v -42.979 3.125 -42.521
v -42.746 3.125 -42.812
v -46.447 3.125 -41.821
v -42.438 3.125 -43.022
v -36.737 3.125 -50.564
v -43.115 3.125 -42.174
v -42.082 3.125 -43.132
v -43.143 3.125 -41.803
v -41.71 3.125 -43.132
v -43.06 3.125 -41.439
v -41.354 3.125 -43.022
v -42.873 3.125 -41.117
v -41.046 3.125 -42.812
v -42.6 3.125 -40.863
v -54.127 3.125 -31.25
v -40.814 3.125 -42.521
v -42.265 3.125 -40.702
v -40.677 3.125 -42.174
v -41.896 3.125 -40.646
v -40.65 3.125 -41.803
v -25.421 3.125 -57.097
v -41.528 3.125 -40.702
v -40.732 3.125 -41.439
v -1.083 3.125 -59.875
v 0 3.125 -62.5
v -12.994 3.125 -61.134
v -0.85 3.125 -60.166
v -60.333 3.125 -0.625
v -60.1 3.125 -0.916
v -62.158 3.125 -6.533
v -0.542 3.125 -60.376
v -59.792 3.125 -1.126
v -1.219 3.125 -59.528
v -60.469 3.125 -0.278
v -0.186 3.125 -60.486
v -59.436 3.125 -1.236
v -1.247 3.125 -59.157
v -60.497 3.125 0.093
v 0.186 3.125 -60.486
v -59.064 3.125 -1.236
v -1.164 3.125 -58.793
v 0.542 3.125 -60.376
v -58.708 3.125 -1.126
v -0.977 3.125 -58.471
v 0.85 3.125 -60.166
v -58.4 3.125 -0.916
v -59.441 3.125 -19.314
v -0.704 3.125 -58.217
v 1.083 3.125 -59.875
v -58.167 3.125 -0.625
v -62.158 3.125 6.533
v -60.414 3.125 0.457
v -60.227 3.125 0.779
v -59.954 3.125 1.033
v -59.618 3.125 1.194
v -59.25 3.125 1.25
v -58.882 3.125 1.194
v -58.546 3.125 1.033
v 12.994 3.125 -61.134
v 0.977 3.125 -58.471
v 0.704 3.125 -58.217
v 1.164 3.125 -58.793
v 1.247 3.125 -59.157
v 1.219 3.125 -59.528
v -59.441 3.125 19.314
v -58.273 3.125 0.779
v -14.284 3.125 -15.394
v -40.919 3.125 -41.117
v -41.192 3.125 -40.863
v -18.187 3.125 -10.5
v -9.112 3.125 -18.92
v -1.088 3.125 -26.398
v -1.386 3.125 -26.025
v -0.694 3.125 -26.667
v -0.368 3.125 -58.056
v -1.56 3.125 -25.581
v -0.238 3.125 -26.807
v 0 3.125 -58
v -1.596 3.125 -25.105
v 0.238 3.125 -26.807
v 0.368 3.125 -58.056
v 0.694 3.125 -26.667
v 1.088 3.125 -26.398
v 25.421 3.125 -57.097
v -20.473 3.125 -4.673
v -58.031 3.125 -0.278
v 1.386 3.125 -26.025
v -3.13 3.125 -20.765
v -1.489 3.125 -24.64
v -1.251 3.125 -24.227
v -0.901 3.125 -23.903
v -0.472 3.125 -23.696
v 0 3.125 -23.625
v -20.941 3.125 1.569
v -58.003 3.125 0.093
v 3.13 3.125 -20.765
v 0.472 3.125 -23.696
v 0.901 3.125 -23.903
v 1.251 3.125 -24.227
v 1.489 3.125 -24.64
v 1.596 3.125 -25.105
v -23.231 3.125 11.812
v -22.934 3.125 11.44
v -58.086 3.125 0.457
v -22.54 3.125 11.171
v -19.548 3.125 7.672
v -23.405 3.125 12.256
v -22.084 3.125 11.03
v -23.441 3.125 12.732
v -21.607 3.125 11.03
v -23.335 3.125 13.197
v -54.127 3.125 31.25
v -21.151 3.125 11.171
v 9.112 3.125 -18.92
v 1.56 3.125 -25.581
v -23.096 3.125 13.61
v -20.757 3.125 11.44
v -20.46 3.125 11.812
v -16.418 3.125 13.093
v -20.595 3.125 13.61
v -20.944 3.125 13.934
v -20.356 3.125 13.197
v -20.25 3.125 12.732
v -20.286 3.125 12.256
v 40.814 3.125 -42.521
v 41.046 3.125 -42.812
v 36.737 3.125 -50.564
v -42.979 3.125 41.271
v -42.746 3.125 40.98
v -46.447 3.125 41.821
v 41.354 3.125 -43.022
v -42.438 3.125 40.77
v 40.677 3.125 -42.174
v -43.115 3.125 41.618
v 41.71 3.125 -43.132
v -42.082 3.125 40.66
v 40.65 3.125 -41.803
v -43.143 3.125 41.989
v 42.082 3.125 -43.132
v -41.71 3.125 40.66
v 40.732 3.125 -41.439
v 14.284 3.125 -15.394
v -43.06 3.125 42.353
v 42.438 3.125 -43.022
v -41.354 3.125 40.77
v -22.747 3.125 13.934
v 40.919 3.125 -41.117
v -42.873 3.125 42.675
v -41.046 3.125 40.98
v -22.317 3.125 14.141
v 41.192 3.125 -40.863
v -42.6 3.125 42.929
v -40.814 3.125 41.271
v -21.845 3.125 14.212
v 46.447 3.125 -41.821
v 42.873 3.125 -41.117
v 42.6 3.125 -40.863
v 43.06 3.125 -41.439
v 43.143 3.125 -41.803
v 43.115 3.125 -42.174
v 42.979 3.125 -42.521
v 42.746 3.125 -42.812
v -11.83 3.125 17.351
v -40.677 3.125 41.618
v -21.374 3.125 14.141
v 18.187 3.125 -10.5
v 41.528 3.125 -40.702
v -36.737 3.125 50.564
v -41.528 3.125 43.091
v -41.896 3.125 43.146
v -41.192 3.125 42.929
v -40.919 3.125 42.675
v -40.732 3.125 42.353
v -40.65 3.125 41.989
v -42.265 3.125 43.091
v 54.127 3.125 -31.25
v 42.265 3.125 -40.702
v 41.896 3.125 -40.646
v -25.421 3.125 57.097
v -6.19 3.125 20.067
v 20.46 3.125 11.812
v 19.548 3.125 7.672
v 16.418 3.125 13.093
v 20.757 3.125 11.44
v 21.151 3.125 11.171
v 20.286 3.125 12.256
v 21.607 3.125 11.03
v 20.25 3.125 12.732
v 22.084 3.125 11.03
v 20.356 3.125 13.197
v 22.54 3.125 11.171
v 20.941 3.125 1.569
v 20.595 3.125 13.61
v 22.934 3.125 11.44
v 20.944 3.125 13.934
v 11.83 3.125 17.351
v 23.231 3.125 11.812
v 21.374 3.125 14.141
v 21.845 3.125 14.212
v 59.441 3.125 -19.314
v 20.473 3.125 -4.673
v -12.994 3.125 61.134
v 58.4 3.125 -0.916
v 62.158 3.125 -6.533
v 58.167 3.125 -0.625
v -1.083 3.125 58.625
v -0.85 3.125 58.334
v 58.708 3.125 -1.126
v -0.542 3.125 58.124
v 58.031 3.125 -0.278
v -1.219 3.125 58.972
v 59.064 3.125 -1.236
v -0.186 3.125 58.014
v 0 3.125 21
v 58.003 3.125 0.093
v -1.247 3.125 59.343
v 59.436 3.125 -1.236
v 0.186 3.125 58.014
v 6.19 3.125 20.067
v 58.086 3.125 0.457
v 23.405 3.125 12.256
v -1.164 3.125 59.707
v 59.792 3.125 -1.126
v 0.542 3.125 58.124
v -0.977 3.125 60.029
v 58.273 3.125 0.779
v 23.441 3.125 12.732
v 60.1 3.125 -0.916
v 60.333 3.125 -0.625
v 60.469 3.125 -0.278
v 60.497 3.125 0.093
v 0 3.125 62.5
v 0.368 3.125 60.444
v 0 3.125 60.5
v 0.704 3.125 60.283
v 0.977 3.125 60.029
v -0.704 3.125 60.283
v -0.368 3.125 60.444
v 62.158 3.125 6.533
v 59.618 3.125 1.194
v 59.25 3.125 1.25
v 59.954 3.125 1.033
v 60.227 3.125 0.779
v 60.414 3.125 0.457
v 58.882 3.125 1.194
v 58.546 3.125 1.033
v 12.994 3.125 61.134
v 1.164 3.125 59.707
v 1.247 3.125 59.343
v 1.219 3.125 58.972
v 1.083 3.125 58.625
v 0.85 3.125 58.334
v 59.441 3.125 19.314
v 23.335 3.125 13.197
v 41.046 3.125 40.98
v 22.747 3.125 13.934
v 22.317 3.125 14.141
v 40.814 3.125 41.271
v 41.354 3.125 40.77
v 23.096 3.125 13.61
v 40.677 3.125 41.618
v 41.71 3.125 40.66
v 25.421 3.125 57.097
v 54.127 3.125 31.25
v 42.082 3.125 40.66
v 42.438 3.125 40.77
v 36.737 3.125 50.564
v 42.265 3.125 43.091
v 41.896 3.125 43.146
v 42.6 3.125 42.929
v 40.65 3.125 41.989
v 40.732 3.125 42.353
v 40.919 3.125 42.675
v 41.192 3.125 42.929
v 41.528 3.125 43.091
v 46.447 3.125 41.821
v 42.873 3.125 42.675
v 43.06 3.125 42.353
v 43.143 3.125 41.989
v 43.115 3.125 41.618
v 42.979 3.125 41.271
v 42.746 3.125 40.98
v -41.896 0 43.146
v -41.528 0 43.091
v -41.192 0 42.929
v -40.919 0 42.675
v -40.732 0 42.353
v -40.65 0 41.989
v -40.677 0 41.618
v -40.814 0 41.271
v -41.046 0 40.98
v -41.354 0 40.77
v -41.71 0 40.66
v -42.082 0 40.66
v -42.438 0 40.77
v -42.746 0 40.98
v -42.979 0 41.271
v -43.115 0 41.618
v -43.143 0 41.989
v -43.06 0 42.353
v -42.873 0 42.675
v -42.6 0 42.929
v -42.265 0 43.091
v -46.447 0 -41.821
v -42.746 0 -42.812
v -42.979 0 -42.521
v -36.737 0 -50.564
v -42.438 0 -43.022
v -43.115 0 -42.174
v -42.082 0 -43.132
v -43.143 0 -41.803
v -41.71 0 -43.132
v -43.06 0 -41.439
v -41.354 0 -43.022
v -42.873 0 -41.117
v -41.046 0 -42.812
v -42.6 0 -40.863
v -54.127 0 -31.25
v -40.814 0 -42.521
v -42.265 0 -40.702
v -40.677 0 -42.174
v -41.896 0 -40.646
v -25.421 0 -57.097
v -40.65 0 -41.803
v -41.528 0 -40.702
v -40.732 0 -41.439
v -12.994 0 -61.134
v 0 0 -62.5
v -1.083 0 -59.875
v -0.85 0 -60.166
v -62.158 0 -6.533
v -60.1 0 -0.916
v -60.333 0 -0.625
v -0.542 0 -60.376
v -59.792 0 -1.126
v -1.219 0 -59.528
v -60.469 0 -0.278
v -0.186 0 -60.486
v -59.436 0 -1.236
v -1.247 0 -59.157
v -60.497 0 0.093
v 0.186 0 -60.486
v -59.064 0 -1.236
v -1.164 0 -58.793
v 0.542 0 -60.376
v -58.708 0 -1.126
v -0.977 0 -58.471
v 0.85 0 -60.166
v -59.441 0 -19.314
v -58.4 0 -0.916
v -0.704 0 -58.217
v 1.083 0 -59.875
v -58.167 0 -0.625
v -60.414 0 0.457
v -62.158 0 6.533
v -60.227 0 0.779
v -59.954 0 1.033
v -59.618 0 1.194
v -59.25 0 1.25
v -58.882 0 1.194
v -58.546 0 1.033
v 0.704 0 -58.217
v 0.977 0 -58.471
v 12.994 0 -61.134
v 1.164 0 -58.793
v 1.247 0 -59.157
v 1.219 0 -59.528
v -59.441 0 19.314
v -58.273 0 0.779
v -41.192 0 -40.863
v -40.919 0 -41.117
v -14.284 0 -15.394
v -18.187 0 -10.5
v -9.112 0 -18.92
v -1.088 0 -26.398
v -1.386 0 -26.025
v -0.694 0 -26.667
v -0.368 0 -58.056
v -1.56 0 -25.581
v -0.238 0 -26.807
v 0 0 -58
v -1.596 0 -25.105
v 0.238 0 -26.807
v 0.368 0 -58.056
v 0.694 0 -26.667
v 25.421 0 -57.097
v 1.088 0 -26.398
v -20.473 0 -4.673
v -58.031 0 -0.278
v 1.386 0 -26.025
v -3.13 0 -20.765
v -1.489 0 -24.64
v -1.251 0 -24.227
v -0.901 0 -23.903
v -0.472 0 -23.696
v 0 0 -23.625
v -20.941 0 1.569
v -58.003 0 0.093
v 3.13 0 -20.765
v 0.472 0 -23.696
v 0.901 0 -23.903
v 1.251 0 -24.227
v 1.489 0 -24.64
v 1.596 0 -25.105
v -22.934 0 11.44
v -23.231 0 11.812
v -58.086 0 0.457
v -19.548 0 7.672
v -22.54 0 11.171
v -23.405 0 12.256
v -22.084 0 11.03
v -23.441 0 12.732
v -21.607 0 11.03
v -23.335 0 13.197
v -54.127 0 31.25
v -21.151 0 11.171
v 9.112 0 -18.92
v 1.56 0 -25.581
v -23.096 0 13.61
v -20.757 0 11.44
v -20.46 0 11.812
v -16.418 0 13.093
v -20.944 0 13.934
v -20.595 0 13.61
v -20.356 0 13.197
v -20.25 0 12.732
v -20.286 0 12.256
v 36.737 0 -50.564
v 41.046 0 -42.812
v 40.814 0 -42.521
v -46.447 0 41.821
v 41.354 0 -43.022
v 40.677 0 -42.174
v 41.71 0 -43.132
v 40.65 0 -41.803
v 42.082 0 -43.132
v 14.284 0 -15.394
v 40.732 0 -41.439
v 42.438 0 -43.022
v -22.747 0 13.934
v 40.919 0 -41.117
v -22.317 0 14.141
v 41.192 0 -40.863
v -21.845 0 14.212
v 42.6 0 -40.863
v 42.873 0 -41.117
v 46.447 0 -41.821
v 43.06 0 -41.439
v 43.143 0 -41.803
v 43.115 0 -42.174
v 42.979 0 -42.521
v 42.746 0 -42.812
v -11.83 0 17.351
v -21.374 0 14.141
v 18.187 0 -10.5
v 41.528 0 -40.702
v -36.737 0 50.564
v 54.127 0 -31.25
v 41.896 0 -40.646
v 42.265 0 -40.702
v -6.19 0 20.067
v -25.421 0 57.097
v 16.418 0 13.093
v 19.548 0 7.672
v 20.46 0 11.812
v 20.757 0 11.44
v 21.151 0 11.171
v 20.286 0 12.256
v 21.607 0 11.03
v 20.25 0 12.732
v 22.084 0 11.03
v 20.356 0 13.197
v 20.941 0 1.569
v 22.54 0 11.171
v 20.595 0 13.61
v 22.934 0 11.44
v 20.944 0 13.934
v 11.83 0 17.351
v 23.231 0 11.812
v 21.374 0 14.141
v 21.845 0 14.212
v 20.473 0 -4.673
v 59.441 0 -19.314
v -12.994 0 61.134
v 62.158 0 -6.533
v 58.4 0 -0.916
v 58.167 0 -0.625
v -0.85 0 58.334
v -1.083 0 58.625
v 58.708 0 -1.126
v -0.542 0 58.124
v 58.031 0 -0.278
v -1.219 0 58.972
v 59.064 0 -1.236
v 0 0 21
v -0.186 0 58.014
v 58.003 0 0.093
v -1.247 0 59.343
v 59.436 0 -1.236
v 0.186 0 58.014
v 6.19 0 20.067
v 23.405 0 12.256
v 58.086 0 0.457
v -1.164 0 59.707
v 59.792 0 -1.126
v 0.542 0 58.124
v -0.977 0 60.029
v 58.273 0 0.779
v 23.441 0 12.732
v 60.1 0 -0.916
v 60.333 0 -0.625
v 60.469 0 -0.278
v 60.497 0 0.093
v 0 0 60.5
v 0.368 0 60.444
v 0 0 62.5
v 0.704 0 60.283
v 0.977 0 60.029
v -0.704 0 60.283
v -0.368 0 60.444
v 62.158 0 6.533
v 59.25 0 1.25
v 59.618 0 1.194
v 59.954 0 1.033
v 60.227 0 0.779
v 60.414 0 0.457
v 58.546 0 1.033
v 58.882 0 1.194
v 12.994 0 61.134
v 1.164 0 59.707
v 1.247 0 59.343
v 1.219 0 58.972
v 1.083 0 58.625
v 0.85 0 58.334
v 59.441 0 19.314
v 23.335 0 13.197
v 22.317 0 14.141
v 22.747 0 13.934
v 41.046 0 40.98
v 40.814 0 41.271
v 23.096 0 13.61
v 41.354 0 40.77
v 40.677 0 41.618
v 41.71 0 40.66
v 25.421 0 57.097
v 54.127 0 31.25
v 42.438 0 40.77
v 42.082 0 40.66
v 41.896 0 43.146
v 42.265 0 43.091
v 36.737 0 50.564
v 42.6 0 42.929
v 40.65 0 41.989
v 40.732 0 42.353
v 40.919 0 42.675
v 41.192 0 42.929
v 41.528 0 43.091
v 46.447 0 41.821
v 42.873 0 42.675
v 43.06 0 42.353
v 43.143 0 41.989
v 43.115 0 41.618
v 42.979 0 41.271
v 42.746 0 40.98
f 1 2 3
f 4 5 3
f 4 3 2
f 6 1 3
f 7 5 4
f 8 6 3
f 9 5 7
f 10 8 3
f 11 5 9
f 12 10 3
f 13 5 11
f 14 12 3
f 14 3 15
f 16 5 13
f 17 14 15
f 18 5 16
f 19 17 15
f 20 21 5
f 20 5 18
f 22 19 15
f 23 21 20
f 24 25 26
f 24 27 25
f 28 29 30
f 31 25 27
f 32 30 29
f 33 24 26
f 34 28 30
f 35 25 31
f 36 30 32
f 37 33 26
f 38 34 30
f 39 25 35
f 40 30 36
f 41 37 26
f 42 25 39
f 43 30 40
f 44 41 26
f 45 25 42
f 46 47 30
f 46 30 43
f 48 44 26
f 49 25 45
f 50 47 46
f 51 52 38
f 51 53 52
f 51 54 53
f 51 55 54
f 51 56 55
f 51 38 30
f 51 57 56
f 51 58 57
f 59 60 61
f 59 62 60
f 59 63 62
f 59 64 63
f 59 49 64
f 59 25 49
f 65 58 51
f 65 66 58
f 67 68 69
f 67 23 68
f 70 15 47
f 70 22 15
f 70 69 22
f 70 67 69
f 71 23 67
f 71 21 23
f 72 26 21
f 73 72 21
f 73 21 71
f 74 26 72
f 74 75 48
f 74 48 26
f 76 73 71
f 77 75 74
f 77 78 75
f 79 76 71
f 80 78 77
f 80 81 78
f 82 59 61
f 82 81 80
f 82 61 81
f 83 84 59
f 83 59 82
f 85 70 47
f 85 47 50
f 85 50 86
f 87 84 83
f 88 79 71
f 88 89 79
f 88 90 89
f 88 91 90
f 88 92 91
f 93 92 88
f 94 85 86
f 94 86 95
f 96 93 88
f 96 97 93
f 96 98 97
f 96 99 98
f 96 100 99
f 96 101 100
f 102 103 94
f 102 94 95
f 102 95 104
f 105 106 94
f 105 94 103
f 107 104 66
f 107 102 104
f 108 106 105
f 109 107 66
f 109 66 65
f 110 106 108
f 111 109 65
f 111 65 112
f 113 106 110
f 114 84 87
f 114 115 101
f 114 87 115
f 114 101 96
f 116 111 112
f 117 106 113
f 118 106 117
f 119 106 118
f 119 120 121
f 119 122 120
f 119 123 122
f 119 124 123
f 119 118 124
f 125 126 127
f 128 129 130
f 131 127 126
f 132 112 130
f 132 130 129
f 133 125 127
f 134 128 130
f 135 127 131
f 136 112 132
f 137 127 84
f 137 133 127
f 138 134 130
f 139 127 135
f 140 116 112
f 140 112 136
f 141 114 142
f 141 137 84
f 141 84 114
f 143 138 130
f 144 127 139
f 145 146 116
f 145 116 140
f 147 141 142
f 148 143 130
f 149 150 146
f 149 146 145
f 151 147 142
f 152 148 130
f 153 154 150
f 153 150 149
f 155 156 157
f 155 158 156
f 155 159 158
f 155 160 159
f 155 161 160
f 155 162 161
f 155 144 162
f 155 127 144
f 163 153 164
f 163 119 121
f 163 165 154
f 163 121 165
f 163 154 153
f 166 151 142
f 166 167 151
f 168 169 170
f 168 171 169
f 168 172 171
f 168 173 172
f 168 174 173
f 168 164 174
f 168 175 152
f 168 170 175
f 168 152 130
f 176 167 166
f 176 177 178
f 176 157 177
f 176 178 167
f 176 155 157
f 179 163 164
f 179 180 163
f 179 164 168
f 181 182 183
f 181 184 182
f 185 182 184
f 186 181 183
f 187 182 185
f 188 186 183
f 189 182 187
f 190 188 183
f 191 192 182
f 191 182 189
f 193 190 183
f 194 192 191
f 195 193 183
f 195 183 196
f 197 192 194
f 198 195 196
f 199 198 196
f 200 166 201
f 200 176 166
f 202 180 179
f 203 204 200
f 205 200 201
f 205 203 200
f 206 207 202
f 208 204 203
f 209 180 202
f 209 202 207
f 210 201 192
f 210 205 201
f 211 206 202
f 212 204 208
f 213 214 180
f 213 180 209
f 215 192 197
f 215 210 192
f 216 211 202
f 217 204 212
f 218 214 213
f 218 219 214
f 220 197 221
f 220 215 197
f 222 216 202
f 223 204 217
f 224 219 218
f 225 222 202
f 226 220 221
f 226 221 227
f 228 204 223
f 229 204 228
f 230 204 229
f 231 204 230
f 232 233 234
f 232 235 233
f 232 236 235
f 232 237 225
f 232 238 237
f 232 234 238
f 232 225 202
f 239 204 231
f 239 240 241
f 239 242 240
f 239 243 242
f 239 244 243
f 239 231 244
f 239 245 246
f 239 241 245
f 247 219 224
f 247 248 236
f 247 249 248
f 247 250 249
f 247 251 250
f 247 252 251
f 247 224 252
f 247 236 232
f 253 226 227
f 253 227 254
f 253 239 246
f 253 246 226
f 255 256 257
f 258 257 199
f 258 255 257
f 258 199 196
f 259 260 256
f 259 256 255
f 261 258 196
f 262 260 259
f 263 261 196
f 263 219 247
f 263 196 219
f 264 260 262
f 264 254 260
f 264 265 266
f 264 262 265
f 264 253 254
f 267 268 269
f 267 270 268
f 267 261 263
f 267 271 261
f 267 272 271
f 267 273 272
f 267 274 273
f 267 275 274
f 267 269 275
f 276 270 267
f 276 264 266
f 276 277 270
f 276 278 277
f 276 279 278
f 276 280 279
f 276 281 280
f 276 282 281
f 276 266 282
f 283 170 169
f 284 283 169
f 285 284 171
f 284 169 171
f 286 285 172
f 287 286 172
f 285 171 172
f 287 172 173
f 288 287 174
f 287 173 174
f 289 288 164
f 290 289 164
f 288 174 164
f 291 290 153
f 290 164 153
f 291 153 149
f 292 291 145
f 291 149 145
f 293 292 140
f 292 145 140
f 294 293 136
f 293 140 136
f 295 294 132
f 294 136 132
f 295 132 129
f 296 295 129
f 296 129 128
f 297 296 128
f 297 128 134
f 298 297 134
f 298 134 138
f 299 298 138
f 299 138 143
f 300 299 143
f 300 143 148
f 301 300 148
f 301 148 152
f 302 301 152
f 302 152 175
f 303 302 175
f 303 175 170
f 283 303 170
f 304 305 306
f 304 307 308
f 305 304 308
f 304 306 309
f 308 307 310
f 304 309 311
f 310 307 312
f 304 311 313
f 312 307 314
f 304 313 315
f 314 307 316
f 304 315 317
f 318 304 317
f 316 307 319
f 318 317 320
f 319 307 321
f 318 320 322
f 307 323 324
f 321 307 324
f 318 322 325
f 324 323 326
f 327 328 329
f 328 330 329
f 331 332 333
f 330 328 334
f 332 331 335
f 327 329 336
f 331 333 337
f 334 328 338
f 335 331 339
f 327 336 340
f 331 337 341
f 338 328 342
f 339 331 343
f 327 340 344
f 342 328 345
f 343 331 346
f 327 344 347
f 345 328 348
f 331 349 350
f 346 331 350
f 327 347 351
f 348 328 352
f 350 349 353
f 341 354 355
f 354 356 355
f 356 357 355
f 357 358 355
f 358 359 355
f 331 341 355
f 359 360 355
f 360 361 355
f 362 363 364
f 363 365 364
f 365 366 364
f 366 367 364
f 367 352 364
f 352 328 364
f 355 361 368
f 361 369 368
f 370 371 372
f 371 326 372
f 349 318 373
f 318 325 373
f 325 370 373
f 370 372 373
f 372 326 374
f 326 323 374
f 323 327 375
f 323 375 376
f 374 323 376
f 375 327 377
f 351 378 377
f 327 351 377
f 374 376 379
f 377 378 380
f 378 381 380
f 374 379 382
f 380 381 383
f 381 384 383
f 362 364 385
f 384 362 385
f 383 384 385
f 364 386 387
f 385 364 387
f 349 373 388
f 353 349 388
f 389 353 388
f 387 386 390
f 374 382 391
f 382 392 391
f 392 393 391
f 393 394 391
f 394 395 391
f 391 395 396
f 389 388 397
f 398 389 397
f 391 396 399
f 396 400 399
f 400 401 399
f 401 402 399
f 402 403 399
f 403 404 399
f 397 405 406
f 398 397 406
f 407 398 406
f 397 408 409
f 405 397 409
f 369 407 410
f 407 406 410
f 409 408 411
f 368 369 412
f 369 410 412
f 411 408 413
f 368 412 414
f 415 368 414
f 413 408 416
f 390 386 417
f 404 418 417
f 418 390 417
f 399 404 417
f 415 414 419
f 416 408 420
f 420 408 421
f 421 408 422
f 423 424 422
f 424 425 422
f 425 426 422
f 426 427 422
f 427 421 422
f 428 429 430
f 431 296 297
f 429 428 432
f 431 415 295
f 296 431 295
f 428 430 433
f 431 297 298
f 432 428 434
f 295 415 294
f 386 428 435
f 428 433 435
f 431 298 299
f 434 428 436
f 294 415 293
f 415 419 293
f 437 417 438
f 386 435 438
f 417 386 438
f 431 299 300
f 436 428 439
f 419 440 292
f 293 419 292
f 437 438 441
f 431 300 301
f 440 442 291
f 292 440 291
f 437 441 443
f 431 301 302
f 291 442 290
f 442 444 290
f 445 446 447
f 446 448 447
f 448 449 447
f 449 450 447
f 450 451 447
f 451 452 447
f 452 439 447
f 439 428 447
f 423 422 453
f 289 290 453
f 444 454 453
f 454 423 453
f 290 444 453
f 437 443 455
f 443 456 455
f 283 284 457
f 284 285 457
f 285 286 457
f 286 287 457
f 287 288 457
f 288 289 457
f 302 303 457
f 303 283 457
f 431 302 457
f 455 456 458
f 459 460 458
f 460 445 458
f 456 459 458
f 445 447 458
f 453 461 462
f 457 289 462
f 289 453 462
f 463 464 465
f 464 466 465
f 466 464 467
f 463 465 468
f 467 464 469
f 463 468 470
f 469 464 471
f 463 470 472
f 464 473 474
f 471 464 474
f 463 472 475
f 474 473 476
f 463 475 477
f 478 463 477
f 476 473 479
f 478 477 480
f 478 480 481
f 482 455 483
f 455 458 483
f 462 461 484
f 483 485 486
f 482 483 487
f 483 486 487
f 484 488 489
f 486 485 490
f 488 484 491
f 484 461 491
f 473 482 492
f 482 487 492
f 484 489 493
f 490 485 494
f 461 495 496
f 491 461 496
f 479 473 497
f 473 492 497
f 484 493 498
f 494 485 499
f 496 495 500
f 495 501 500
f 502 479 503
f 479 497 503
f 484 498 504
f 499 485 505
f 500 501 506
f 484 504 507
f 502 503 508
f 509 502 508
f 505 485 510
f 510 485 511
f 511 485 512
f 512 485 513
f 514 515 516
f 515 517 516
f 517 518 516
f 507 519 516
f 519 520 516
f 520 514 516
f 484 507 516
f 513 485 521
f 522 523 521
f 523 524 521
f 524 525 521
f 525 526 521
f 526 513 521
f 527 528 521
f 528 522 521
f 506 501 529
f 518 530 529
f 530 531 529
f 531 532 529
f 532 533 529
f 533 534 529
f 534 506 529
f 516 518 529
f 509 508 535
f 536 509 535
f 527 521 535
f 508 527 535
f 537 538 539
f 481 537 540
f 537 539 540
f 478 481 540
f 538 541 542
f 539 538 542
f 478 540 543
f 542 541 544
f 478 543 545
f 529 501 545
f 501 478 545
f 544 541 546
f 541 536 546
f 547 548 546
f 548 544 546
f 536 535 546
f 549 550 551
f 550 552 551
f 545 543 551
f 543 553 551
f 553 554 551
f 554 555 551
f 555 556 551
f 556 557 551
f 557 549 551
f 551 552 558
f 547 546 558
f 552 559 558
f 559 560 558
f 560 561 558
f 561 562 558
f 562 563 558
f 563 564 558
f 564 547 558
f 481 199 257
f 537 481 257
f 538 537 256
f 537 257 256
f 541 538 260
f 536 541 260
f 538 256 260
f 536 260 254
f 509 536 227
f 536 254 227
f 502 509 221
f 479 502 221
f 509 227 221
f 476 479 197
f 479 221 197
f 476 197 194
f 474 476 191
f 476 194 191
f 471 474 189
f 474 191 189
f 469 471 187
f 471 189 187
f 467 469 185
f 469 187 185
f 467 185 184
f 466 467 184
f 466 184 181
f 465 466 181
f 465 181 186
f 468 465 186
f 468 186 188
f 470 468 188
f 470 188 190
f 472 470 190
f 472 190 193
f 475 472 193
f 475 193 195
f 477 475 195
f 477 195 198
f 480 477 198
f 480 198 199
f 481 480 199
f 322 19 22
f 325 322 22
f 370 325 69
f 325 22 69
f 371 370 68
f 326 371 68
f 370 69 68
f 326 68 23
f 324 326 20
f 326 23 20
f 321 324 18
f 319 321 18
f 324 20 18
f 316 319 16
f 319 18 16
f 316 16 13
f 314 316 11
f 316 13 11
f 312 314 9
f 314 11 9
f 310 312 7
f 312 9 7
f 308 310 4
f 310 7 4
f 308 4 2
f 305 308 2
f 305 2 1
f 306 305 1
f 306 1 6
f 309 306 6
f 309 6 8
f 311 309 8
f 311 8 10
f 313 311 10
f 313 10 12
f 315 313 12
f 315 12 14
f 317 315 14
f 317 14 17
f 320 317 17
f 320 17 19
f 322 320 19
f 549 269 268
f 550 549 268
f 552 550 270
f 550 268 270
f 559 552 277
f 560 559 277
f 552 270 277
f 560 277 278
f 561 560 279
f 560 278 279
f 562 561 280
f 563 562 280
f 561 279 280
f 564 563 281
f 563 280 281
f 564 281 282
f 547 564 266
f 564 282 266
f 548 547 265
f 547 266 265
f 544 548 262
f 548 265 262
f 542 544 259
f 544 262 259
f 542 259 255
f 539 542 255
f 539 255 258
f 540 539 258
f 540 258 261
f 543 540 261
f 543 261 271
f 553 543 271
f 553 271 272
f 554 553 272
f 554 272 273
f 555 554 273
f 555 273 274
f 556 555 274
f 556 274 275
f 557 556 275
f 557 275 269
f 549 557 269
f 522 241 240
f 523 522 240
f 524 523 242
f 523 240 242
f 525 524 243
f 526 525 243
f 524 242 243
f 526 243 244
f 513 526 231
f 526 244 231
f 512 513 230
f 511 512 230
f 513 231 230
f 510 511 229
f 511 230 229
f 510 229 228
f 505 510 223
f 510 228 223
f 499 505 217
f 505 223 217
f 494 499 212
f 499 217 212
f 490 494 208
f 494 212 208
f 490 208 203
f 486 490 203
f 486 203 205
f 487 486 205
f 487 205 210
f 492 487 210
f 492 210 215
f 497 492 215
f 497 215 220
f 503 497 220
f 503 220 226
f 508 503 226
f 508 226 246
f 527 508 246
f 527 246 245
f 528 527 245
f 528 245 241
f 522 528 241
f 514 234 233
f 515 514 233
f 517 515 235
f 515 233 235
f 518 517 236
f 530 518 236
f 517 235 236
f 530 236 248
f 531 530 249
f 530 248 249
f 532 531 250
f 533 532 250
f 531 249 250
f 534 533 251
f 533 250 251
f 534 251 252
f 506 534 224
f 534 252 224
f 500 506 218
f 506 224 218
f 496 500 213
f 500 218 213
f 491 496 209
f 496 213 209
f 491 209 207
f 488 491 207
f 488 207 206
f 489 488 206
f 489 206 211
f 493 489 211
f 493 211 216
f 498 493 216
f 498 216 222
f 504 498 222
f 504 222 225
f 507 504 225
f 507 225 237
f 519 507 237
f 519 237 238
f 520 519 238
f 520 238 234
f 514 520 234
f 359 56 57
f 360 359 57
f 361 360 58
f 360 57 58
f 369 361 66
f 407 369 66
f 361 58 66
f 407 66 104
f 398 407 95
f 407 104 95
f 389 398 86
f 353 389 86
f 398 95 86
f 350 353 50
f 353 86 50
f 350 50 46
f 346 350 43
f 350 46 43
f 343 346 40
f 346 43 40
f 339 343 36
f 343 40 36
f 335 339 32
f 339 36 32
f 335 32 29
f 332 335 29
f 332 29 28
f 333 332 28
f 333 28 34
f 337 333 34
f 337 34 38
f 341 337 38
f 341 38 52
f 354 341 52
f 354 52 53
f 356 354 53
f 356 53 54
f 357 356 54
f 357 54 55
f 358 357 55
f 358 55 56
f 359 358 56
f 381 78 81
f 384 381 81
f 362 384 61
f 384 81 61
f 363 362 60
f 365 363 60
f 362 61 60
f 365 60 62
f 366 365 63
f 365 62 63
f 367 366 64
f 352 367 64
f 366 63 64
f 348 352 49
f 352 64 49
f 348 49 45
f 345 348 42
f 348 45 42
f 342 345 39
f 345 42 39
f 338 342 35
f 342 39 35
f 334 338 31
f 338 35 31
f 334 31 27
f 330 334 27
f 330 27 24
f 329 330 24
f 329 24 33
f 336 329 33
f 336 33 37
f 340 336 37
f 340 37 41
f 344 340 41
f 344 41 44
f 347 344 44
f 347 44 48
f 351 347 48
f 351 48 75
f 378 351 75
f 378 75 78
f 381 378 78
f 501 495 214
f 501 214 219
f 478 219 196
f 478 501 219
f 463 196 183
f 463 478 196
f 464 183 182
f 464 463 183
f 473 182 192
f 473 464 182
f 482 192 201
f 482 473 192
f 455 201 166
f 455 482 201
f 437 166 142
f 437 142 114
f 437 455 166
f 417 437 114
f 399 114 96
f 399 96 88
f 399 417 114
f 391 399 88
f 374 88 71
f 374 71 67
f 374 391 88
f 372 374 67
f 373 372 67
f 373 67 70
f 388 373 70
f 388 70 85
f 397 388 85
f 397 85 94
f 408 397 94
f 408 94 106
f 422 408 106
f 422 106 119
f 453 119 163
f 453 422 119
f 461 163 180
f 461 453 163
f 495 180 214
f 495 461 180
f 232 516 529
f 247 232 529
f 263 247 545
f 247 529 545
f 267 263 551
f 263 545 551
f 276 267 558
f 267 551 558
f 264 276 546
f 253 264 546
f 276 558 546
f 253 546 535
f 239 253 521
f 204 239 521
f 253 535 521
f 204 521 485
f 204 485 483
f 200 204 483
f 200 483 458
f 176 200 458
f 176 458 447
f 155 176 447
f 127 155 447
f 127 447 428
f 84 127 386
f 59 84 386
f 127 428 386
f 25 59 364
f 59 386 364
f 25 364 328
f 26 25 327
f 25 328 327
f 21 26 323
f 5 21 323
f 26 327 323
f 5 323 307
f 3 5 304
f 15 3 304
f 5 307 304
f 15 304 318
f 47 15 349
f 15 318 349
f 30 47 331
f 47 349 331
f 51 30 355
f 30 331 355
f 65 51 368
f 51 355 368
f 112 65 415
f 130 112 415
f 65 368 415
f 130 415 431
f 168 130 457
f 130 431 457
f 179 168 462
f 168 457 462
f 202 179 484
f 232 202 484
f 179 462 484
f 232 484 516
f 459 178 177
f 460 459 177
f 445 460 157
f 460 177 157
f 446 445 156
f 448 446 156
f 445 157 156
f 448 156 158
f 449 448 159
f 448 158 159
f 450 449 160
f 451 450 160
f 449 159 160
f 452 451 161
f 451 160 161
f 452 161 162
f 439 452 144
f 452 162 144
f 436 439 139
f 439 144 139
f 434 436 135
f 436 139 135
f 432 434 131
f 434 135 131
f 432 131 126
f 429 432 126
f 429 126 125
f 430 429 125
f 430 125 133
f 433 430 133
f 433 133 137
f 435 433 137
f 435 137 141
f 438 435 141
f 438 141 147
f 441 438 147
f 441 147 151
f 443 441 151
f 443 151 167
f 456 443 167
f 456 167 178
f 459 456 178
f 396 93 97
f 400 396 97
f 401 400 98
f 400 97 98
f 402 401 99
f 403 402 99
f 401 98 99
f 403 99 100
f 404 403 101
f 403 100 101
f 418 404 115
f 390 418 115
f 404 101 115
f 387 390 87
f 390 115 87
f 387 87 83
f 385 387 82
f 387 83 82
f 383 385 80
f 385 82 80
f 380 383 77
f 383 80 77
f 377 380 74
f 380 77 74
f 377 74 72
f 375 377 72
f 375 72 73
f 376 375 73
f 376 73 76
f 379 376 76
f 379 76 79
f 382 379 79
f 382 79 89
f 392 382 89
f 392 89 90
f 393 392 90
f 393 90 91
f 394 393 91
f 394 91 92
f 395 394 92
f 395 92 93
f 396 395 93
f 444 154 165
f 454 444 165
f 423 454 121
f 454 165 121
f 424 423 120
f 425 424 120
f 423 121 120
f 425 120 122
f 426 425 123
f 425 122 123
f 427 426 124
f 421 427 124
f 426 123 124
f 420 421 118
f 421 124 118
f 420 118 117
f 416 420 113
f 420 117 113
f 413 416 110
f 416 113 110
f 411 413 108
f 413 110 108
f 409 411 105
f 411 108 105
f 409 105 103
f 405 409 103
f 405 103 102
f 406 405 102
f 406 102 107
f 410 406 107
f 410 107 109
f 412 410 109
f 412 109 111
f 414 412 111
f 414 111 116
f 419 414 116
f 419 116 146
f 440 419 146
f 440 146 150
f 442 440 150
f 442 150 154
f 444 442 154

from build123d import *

# Parameters (mm, degrees)
SKETCH1_R           = 62.5
SKETCH1_R_2         = 21
BOSS_EXTRUDE1_DEPTH = 3.125
SKETCH2_R           = 1.6
CUT_EXTRUDE1_DEPTH  = 89.443573113
SKETCH6_R           = 1.25
CUT_EXTRUDE3_DEPTH  = 89.443573113


with BuildPart() as part:
    # Sketch1 → Boss-Extrude1 (new body)
    with BuildSketch(Plane(origin=(0, 0, 0), x_dir=(1, 0, 0), z_dir=(0, 1, 0))):
        with Locations(Location((0, 0, 0), (0, 0, 270))):
            Circle(SKETCH1_R)
        with Locations(Location((0, 0, 0), (0, 0, 270))):
            Circle(SKETCH1_R_2, mode=Mode.SUBTRACT)
    extrude(amount=BOSS_EXTRUDE1_DEPTH)

    # Sketch2 → Cut-Extrude1 (cut, through all)
    with BuildSketch(Plane(origin=(0, 3.125, 0), x_dir=(1, 0, 0), z_dir=(0, 1, 0))):
        with Locations(Location((0, 25.225, 0), (0, 0, 270))):
            Circle(SKETCH2_R)
        with Locations(Location((21.84549081, -12.6125, 0), (0, 0, 270))):
            Circle(SKETCH2_R)
        with Locations(Location((-21.84549081, -12.6125, 0), (0, 0, 270))):
            Circle(SKETCH2_R)
    extrude(amount=-CUT_EXTRUDE1_DEPTH, mode=Mode.SUBTRACT)

    # Sketch6 → Cut-Extrude3 (cut, through all)
    with BuildSketch(Plane(origin=(0, 3.125, 0), x_dir=(1, 0, 0), z_dir=(0, 1, 0))):
        with Locations(Location((-41.896076785, 41.896076785, 0), (0, 0, 270))):
            Circle(SKETCH6_R)
        with Locations(Location((41.896076785, 41.896076785, 0), (0, 0, 270))):
            Circle(SKETCH6_R)
        with Locations(Location((-41.896076785, -41.896076785, 0), (0, 0, 270))):
            Circle(SKETCH6_R)
        with Locations(Location((41.896076785, -41.896076785, 0), (0, 0, 270))):
            Circle(SKETCH6_R)
        with Locations(Location((-59.25, 0, 0), (0, 0, 270))):
            Circle(SKETCH6_R)
        with Locations(Location((59.25, 0, 0), (0, 0, 270))):
            Circle(SKETCH6_R)
        with Locations(Location((0, 59.25, 0), (0, 0, 270))):
            Circle(SKETCH6_R)
        with Locations(Location((0, -59.25, 0), (0, 0, 270))):
            Circle(SKETCH6_R)
    extrude(amount=-CUT_EXTRUDE3_DEPTH, mode=Mode.SUBTRACT)


solid = part.part
